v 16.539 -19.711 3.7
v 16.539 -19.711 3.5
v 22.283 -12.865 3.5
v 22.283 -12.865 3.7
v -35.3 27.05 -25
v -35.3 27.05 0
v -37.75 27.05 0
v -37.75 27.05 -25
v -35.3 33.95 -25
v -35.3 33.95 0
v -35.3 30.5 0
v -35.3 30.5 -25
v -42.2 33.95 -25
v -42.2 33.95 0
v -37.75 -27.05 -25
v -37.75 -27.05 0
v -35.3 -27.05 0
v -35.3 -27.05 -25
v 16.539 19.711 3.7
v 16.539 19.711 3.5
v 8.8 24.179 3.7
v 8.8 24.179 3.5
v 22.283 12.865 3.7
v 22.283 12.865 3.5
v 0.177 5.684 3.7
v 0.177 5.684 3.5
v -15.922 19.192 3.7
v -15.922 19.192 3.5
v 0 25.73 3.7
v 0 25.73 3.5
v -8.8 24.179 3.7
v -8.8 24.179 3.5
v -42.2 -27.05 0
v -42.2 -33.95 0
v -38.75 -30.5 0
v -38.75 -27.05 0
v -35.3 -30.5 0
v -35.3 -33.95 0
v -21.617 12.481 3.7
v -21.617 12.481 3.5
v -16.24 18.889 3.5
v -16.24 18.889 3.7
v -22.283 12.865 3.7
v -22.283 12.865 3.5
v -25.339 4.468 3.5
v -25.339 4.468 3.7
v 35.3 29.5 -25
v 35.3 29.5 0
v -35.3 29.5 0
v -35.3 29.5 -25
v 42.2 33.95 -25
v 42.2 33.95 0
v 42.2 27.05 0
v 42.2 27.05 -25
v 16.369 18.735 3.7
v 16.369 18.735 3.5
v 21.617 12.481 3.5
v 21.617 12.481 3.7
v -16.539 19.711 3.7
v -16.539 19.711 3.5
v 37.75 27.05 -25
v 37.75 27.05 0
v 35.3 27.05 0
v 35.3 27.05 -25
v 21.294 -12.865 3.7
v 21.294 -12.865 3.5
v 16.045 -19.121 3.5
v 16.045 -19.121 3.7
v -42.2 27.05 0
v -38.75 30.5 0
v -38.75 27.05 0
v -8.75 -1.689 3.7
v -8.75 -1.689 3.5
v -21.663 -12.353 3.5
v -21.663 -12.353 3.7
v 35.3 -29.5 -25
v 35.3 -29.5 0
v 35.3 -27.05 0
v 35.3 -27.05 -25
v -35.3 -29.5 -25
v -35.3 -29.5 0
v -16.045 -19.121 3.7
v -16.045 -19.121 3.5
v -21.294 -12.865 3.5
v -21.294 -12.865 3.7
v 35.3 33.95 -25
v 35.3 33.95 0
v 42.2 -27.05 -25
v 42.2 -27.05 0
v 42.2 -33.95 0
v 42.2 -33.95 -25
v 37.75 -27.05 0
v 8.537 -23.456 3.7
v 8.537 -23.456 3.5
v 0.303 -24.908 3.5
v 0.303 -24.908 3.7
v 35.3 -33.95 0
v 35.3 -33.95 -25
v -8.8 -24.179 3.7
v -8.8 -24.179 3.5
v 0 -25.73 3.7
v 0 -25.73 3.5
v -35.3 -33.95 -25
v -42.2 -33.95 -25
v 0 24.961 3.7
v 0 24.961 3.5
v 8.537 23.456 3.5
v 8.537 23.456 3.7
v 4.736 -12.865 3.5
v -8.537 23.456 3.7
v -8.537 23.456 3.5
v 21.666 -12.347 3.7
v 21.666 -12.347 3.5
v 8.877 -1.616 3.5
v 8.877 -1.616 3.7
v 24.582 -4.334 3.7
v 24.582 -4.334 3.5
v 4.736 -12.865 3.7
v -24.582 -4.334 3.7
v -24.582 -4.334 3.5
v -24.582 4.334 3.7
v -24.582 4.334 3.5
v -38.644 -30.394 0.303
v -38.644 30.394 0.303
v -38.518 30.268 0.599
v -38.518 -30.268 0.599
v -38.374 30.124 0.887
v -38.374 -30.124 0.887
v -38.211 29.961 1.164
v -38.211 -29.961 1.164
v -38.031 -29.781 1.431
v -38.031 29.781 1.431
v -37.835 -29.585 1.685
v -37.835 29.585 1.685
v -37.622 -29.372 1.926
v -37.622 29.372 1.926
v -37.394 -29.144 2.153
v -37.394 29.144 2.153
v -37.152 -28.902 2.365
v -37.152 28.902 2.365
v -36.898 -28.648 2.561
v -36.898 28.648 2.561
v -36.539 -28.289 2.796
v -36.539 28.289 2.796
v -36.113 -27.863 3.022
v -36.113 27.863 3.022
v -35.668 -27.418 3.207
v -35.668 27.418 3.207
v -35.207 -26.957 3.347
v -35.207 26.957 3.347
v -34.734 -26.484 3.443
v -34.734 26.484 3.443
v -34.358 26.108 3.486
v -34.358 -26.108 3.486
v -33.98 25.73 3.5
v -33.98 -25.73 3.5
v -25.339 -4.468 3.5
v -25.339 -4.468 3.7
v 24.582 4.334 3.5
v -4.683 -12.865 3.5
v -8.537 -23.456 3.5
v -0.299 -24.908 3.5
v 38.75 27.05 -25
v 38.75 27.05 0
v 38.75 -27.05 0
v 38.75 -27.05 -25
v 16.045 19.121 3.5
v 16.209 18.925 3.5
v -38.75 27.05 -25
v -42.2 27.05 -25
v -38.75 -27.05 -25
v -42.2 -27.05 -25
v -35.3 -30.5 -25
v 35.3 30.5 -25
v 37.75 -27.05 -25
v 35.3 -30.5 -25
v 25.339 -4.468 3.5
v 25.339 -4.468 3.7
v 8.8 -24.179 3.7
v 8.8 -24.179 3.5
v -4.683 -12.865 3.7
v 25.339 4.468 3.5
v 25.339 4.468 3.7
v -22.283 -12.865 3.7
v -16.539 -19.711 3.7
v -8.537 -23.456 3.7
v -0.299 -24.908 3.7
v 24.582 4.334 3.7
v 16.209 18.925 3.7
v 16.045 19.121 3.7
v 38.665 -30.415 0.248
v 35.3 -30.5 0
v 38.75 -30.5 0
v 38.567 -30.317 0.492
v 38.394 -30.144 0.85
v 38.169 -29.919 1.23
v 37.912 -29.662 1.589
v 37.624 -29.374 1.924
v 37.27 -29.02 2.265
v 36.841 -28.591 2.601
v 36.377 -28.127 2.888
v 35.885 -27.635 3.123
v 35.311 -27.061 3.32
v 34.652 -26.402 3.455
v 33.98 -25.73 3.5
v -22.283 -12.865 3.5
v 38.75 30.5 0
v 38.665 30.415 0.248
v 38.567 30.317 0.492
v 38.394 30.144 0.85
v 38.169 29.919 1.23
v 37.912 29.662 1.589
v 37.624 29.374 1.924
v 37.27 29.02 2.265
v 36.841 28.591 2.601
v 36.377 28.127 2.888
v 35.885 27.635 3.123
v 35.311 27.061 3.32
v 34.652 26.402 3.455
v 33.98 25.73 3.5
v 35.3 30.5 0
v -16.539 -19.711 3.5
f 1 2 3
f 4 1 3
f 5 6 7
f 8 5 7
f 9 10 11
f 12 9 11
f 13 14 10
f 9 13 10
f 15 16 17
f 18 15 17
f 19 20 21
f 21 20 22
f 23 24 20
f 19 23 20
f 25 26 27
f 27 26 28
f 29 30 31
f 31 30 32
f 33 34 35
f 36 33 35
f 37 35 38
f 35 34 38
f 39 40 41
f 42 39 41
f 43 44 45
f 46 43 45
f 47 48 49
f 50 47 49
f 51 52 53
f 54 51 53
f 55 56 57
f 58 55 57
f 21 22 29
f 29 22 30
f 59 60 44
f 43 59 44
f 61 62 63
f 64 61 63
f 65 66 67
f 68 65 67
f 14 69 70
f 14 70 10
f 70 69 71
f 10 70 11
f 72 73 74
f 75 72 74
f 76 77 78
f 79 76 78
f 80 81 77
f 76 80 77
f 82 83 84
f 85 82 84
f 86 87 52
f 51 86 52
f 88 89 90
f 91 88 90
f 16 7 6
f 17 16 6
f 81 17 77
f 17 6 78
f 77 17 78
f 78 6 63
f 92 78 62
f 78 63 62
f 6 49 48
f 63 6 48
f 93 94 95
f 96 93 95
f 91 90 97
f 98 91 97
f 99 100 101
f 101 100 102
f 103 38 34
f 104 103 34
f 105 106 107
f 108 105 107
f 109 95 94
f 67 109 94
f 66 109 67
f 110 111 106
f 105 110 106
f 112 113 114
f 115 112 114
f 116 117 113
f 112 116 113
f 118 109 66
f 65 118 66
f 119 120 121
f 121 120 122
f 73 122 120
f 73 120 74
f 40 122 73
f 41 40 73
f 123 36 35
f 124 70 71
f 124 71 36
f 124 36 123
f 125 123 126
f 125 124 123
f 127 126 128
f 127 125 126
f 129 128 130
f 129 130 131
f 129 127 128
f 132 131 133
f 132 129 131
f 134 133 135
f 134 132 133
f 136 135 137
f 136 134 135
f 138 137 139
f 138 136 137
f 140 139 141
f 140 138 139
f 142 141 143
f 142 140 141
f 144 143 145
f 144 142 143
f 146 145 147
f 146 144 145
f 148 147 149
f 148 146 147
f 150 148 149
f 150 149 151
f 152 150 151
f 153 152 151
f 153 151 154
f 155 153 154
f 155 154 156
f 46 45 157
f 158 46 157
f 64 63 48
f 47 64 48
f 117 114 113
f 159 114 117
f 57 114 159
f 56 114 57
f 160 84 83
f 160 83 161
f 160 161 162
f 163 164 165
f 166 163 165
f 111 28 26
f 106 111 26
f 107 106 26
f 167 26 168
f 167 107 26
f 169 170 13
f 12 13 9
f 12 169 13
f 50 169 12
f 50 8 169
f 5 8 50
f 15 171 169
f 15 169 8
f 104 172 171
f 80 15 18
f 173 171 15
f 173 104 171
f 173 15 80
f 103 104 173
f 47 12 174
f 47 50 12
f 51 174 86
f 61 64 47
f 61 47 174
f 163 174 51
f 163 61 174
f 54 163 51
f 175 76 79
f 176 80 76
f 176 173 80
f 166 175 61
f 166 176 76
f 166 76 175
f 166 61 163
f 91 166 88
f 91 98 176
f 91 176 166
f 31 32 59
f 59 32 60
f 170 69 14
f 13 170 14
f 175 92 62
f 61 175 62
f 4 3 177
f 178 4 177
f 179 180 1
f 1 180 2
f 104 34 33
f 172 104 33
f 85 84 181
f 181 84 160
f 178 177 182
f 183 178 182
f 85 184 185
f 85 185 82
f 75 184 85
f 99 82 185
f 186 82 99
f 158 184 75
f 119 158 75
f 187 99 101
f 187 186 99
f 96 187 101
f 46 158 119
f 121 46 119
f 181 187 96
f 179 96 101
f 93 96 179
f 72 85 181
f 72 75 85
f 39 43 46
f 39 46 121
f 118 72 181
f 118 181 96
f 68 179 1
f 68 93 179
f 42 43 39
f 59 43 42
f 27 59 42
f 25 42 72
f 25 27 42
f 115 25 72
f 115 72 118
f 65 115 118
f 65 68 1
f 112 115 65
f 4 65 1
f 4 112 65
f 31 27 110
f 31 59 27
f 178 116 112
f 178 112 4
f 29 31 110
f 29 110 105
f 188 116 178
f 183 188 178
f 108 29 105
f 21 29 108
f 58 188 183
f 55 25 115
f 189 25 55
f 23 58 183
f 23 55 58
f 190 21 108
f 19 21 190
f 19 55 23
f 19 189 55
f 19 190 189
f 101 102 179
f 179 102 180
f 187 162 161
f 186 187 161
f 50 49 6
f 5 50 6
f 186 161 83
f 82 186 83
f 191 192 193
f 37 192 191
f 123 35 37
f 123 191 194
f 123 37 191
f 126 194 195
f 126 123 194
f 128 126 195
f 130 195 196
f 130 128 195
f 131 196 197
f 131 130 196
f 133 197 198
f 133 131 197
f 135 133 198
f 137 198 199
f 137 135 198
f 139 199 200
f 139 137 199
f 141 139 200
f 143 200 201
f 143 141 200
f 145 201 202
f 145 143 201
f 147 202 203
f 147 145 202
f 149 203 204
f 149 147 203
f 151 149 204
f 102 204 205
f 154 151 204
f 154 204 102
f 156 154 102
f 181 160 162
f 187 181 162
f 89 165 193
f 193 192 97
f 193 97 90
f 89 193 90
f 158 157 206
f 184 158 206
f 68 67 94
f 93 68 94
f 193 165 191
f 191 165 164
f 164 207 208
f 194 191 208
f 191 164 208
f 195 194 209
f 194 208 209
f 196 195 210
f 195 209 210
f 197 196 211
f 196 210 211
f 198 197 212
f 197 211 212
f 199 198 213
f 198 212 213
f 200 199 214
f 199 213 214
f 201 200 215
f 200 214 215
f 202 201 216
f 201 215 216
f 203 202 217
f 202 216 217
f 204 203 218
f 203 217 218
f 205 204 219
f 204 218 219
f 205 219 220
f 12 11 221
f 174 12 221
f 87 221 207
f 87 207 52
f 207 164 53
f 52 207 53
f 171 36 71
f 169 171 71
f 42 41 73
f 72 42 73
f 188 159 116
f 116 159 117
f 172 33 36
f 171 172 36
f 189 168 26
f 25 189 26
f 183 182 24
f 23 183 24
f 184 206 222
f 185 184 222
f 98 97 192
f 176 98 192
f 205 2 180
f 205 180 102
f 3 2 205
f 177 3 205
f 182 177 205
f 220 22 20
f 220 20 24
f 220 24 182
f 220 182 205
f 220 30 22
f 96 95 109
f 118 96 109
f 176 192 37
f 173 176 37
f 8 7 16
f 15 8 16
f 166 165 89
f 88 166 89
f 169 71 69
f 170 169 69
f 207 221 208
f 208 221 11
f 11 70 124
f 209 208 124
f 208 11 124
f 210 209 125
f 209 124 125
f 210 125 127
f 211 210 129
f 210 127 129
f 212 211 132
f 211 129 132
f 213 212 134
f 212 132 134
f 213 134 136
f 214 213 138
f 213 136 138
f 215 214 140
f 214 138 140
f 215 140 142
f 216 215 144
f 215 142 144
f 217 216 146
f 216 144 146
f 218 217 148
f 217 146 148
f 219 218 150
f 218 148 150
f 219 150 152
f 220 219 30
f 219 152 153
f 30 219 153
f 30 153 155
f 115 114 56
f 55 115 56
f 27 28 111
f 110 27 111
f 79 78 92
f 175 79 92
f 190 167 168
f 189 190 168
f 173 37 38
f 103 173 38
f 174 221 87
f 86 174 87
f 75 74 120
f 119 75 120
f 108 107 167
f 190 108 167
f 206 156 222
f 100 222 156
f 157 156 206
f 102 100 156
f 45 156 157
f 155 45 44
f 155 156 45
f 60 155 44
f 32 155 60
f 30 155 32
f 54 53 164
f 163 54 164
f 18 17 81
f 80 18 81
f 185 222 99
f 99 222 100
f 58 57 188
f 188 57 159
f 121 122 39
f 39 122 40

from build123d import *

# Parameters (mm, degrees)
F0_W        = 77.5
F0_H        = 61
F1_DEPTH    = 3.5
F2_T1_DEPTH = 84.8484800354
F2_T3_DEPTH = 101.3484800354
F5_DEPTH    = 25
F6_DEPTH    = 0.2


# Not quite as in the source:
# - a fillet or chamfer that OpenCascade refuses, or shapes differently, is made with other operations: its cross-section is extruded or revolved along the edge and cut away or added


with BuildPart() as f1:
    # F0 (on Top) → F1 (new body)
    with BuildSketch(Plane.XY):
        Rectangle(F0_W, F0_H)
    extrude(amount=F1_DEPTH)

    # F2: fillet of radius 5 on 4 edges, made by hand

    # F2_s2 → F2_t1 (cut)
    with BuildSketch(Plane.XZ.offset(-42.4242400177)):
        with BuildLine():
            ThreePointArc((38.75, 0), (36.9383438845, 2.5311288741), (33.9803039929, 3.5))
            Line((33.9803039929, 3.5), (38.75, 3.5))
            Line((38.75, 3.5), (38.75, 0))
        make_face()
        with BuildLine():
            ThreePointArc((-38.75, 0), (-36.9383438845, 2.5311288741), (-33.9803039929, 3.5))
            Line((-33.9803039929, 3.5), (-38.75, 3.5))
            Line((-38.75, 3.5), (-38.75, 0))
        make_face()
    extrude(amount=F2_T1_DEPTH, mode=Mode.SUBTRACT)

    # F2_s4 → F2_t3 (cut)
    with BuildSketch(Plane.YZ.offset(-50.6742400177)):
        with BuildLine():
            ThreePointArc((30.5, 0), (28.6883438845, 2.5311288741), (25.7303039929, 3.5))
            Line((25.7303039929, 3.5), (30.5, 3.5))
            Line((30.5, 3.5), (30.5, 0))
        make_face()
        with BuildLine():
            ThreePointArc((-30.5, 0), (-28.6883438845, 2.5311288741), (-25.7303039929, 3.5))
            Line((-25.7303039929, 3.5), (-30.5, 3.5))
            Line((-30.5, 3.5), (-30.5, 0))
        make_face()
    extrude(amount=F2_T3_DEPTH, mode=Mode.SUBTRACT)

    # F4 (on face) → F5 (join)
    with BuildSketch(Plane(origin=(0, 0, 0), x_dir=(1, 0, 0), z_dir=(0, 0, -1))):
        Polygon((-38.75, 29.5), (-38.75, 30.5), (-37.75, 30.5), (-35.3, 30.5), (-35.3, 33.95), (-42.2, 33.95), (-42.2, 27.05), (-38.75, 27.05), align=None)
        Polygon((-37.75, 30.5), (-38.75, 30.5), (-38.75, 29.5), (-38.75, 27.05), (-38.75, -27.05), (-38.75, -29.5), (-38.75, -30.5), (-37.75, -30.5), (-35.3, -30.5), (35.3, -30.5), (37.75, -30.5), (38.75, -30.5), (38.75, -29.5), (38.75, -27.05), (38.75, 27.05), (38.75, 29.5), (38.75, 30.5), (37.75, 30.5), (35.3, 30.5), (-35.3, 30.5), align=None)
        Polygon((-35.3, 27.05), (-35.3, 29.5), (35.3, 29.5), (35.3, 27.05), (37.75, 27.05), (37.75, -27.05), (35.3, -27.05), (35.3, -29.5), (-35.3, -29.5), (-35.3, -27.05), (-37.75, -27.05), (-37.75, 27.05), align=None, mode=Mode.SUBTRACT)
        Polygon((35.3, 33.95), (35.3, 30.5), (37.75, 30.5), (38.75, 30.5), (38.75, 29.5), (38.75, 27.05), (42.2, 27.05), (42.2, 33.95), align=None)
        Polygon((-38.75, -29.5), (-38.75, -27.05), (-42.2, -27.05), (-42.2, -33.95), (-35.3, -33.95), (-35.3, -30.5), (-37.75, -30.5), (-38.75, -30.5), align=None)
        Polygon((42.2, -27.05), (38.75, -27.05), (38.75, -29.5), (38.75, -30.5), (37.75, -30.5), (35.3, -30.5), (35.3, -33.95), (42.2, -33.95), align=None)
    extrude(amount=F5_DEPTH)

    # F3 (on face) → F6 (join)
    with BuildSketch(Plane.XY.offset(3.5)):
        Polygon((-16.2400073105, 18.8887493843), (-8.7504151188, -1.6887360431), (0.1768791019, 5.6841672089), (-15.9216975961, 19.1924769786), (-16.0447749761, 19.1214182202), align=None)
        Polygon((-21.294405657, -12.8651519965), (-4.682532386, -12.8651519965), (-8.7504151188, -1.6887360431), (-21.6633903185, -12.3533466729), (-21.6170668475, -12.4806193635), align=None)
        Polygon((-4.682532386, -12.8651519965), (-0.2991132897, -24.9084969837), (0, -24.961238727), (0.3027663667, -24.9078528477), (4.7360081498, -12.8651519965), align=None)
        Polygon((8.8770657691, -1.6161562148), (4.7360081498, -12.8651519965), (21.294405657, -12.8651519965), (21.6170668475, -12.4806193635), (21.665673901, -12.3470725815), align=None)
        Polygon((0.1768791019, 5.6841672089), (8.8770657691, -1.6161562148), (16.3689174848, 18.7351202209), (16.20943331, 18.9251860592), align=None)
        Polygon((-25.3394028596, -4.4680203992), (-22.283096905, -12.8651519965), (-21.6633903185, -12.3533466729), (-24.5820214231, -4.3344736172), (-24.5820214231, 4.3344736172), (-21.6170668475, 12.4806193635), (-16.2400073105, 18.8887493843), (-16.5391206001, 19.7105563935), (-22.283096905, 12.8651519965), (-25.3394028596, 4.4680203992), align=None)
        Polygon((0.3027663667, -24.9078528477), (0, -25.7303039929), (8.8002822595, -24.1785767927), (16.5391206001, -19.7105563935), (22.283096905, -12.8651519965), (21.294405657, -12.8651519965), (16.0447749761, -19.1214182202), (8.537246447, -23.4558918374), align=None)
        Polygon((-8.8002822595, -24.1785767927), (0, -25.7303039929), (-0.2991132897, -24.9084969837), (-8.537246447, -23.4558918374), (-16.0447749761, -19.1214182202), (-21.294405657, -12.8651519965), (-22.283096905, -12.8651519965), (-16.5391206001, -19.7105563935), align=None)
        Polygon((-22.283096905, -12.8651519965), (-21.294405657, -12.8651519965), (-21.6170668475, -12.4806193635), (-21.6633903185, -12.3533466729), align=None)
        Polygon((-16.5391206001, 19.7105563935), (-16.2400073105, 18.8887493843), (-16.0447749761, 19.1214182202), (-15.9216975961, 19.1924769786), align=None)
        Polygon((21.665673901, -12.3470725815), (22.283096905, -12.8651519965), (25.3394028596, -4.4680203992), (25.3394028596, 4.4680203992), (22.283096905, 12.8651519965), (16.5391206001, 19.7105563935), (8.8002822595, 24.1785767927), (0, 25.7303039929), (-8.8002822595, 24.1785767927), (-16.5391206001, 19.7105563935), (-15.9216975961, 19.1924769786), (-8.537246447, 23.4558918374), (0, 24.961238727), (8.537246447, 23.4558918374), (16.0447749761, 19.1214182202), (16.20943331, 18.9251860592), (16.5391206001, 19.1974692878), (16.3689174848, 18.7351202209), (21.6170668475, 12.4806193635), (24.5820214231, 4.3344736172), (24.5820214231, -4.3344736172), align=None)
        Polygon((16.20943331, 18.9251860592), (16.3689174848, 18.7351202209), (16.5391206001, 19.1974692878), align=None)
        Polygon((21.6170668475, -12.4806193635), (21.294405657, -12.8651519965), (22.283096905, -12.8651519965), (21.665673901, -12.3470725815), align=None)
        Polygon((-0.2991132897, -24.9084969837), (0, -25.7303039929), (0.3027663667, -24.9078528477), (0, -24.961238727), align=None)
        Polygon((-8.7504151188, -1.6887360431), (-4.682532386, -12.8651519965), (4.7360081498, -12.8651519965), (8.8770657691, -1.6161562148), (0.1768791019, 5.6841672089), align=None)
    extrude(amount=F6_DEPTH)


solid = f1.part
